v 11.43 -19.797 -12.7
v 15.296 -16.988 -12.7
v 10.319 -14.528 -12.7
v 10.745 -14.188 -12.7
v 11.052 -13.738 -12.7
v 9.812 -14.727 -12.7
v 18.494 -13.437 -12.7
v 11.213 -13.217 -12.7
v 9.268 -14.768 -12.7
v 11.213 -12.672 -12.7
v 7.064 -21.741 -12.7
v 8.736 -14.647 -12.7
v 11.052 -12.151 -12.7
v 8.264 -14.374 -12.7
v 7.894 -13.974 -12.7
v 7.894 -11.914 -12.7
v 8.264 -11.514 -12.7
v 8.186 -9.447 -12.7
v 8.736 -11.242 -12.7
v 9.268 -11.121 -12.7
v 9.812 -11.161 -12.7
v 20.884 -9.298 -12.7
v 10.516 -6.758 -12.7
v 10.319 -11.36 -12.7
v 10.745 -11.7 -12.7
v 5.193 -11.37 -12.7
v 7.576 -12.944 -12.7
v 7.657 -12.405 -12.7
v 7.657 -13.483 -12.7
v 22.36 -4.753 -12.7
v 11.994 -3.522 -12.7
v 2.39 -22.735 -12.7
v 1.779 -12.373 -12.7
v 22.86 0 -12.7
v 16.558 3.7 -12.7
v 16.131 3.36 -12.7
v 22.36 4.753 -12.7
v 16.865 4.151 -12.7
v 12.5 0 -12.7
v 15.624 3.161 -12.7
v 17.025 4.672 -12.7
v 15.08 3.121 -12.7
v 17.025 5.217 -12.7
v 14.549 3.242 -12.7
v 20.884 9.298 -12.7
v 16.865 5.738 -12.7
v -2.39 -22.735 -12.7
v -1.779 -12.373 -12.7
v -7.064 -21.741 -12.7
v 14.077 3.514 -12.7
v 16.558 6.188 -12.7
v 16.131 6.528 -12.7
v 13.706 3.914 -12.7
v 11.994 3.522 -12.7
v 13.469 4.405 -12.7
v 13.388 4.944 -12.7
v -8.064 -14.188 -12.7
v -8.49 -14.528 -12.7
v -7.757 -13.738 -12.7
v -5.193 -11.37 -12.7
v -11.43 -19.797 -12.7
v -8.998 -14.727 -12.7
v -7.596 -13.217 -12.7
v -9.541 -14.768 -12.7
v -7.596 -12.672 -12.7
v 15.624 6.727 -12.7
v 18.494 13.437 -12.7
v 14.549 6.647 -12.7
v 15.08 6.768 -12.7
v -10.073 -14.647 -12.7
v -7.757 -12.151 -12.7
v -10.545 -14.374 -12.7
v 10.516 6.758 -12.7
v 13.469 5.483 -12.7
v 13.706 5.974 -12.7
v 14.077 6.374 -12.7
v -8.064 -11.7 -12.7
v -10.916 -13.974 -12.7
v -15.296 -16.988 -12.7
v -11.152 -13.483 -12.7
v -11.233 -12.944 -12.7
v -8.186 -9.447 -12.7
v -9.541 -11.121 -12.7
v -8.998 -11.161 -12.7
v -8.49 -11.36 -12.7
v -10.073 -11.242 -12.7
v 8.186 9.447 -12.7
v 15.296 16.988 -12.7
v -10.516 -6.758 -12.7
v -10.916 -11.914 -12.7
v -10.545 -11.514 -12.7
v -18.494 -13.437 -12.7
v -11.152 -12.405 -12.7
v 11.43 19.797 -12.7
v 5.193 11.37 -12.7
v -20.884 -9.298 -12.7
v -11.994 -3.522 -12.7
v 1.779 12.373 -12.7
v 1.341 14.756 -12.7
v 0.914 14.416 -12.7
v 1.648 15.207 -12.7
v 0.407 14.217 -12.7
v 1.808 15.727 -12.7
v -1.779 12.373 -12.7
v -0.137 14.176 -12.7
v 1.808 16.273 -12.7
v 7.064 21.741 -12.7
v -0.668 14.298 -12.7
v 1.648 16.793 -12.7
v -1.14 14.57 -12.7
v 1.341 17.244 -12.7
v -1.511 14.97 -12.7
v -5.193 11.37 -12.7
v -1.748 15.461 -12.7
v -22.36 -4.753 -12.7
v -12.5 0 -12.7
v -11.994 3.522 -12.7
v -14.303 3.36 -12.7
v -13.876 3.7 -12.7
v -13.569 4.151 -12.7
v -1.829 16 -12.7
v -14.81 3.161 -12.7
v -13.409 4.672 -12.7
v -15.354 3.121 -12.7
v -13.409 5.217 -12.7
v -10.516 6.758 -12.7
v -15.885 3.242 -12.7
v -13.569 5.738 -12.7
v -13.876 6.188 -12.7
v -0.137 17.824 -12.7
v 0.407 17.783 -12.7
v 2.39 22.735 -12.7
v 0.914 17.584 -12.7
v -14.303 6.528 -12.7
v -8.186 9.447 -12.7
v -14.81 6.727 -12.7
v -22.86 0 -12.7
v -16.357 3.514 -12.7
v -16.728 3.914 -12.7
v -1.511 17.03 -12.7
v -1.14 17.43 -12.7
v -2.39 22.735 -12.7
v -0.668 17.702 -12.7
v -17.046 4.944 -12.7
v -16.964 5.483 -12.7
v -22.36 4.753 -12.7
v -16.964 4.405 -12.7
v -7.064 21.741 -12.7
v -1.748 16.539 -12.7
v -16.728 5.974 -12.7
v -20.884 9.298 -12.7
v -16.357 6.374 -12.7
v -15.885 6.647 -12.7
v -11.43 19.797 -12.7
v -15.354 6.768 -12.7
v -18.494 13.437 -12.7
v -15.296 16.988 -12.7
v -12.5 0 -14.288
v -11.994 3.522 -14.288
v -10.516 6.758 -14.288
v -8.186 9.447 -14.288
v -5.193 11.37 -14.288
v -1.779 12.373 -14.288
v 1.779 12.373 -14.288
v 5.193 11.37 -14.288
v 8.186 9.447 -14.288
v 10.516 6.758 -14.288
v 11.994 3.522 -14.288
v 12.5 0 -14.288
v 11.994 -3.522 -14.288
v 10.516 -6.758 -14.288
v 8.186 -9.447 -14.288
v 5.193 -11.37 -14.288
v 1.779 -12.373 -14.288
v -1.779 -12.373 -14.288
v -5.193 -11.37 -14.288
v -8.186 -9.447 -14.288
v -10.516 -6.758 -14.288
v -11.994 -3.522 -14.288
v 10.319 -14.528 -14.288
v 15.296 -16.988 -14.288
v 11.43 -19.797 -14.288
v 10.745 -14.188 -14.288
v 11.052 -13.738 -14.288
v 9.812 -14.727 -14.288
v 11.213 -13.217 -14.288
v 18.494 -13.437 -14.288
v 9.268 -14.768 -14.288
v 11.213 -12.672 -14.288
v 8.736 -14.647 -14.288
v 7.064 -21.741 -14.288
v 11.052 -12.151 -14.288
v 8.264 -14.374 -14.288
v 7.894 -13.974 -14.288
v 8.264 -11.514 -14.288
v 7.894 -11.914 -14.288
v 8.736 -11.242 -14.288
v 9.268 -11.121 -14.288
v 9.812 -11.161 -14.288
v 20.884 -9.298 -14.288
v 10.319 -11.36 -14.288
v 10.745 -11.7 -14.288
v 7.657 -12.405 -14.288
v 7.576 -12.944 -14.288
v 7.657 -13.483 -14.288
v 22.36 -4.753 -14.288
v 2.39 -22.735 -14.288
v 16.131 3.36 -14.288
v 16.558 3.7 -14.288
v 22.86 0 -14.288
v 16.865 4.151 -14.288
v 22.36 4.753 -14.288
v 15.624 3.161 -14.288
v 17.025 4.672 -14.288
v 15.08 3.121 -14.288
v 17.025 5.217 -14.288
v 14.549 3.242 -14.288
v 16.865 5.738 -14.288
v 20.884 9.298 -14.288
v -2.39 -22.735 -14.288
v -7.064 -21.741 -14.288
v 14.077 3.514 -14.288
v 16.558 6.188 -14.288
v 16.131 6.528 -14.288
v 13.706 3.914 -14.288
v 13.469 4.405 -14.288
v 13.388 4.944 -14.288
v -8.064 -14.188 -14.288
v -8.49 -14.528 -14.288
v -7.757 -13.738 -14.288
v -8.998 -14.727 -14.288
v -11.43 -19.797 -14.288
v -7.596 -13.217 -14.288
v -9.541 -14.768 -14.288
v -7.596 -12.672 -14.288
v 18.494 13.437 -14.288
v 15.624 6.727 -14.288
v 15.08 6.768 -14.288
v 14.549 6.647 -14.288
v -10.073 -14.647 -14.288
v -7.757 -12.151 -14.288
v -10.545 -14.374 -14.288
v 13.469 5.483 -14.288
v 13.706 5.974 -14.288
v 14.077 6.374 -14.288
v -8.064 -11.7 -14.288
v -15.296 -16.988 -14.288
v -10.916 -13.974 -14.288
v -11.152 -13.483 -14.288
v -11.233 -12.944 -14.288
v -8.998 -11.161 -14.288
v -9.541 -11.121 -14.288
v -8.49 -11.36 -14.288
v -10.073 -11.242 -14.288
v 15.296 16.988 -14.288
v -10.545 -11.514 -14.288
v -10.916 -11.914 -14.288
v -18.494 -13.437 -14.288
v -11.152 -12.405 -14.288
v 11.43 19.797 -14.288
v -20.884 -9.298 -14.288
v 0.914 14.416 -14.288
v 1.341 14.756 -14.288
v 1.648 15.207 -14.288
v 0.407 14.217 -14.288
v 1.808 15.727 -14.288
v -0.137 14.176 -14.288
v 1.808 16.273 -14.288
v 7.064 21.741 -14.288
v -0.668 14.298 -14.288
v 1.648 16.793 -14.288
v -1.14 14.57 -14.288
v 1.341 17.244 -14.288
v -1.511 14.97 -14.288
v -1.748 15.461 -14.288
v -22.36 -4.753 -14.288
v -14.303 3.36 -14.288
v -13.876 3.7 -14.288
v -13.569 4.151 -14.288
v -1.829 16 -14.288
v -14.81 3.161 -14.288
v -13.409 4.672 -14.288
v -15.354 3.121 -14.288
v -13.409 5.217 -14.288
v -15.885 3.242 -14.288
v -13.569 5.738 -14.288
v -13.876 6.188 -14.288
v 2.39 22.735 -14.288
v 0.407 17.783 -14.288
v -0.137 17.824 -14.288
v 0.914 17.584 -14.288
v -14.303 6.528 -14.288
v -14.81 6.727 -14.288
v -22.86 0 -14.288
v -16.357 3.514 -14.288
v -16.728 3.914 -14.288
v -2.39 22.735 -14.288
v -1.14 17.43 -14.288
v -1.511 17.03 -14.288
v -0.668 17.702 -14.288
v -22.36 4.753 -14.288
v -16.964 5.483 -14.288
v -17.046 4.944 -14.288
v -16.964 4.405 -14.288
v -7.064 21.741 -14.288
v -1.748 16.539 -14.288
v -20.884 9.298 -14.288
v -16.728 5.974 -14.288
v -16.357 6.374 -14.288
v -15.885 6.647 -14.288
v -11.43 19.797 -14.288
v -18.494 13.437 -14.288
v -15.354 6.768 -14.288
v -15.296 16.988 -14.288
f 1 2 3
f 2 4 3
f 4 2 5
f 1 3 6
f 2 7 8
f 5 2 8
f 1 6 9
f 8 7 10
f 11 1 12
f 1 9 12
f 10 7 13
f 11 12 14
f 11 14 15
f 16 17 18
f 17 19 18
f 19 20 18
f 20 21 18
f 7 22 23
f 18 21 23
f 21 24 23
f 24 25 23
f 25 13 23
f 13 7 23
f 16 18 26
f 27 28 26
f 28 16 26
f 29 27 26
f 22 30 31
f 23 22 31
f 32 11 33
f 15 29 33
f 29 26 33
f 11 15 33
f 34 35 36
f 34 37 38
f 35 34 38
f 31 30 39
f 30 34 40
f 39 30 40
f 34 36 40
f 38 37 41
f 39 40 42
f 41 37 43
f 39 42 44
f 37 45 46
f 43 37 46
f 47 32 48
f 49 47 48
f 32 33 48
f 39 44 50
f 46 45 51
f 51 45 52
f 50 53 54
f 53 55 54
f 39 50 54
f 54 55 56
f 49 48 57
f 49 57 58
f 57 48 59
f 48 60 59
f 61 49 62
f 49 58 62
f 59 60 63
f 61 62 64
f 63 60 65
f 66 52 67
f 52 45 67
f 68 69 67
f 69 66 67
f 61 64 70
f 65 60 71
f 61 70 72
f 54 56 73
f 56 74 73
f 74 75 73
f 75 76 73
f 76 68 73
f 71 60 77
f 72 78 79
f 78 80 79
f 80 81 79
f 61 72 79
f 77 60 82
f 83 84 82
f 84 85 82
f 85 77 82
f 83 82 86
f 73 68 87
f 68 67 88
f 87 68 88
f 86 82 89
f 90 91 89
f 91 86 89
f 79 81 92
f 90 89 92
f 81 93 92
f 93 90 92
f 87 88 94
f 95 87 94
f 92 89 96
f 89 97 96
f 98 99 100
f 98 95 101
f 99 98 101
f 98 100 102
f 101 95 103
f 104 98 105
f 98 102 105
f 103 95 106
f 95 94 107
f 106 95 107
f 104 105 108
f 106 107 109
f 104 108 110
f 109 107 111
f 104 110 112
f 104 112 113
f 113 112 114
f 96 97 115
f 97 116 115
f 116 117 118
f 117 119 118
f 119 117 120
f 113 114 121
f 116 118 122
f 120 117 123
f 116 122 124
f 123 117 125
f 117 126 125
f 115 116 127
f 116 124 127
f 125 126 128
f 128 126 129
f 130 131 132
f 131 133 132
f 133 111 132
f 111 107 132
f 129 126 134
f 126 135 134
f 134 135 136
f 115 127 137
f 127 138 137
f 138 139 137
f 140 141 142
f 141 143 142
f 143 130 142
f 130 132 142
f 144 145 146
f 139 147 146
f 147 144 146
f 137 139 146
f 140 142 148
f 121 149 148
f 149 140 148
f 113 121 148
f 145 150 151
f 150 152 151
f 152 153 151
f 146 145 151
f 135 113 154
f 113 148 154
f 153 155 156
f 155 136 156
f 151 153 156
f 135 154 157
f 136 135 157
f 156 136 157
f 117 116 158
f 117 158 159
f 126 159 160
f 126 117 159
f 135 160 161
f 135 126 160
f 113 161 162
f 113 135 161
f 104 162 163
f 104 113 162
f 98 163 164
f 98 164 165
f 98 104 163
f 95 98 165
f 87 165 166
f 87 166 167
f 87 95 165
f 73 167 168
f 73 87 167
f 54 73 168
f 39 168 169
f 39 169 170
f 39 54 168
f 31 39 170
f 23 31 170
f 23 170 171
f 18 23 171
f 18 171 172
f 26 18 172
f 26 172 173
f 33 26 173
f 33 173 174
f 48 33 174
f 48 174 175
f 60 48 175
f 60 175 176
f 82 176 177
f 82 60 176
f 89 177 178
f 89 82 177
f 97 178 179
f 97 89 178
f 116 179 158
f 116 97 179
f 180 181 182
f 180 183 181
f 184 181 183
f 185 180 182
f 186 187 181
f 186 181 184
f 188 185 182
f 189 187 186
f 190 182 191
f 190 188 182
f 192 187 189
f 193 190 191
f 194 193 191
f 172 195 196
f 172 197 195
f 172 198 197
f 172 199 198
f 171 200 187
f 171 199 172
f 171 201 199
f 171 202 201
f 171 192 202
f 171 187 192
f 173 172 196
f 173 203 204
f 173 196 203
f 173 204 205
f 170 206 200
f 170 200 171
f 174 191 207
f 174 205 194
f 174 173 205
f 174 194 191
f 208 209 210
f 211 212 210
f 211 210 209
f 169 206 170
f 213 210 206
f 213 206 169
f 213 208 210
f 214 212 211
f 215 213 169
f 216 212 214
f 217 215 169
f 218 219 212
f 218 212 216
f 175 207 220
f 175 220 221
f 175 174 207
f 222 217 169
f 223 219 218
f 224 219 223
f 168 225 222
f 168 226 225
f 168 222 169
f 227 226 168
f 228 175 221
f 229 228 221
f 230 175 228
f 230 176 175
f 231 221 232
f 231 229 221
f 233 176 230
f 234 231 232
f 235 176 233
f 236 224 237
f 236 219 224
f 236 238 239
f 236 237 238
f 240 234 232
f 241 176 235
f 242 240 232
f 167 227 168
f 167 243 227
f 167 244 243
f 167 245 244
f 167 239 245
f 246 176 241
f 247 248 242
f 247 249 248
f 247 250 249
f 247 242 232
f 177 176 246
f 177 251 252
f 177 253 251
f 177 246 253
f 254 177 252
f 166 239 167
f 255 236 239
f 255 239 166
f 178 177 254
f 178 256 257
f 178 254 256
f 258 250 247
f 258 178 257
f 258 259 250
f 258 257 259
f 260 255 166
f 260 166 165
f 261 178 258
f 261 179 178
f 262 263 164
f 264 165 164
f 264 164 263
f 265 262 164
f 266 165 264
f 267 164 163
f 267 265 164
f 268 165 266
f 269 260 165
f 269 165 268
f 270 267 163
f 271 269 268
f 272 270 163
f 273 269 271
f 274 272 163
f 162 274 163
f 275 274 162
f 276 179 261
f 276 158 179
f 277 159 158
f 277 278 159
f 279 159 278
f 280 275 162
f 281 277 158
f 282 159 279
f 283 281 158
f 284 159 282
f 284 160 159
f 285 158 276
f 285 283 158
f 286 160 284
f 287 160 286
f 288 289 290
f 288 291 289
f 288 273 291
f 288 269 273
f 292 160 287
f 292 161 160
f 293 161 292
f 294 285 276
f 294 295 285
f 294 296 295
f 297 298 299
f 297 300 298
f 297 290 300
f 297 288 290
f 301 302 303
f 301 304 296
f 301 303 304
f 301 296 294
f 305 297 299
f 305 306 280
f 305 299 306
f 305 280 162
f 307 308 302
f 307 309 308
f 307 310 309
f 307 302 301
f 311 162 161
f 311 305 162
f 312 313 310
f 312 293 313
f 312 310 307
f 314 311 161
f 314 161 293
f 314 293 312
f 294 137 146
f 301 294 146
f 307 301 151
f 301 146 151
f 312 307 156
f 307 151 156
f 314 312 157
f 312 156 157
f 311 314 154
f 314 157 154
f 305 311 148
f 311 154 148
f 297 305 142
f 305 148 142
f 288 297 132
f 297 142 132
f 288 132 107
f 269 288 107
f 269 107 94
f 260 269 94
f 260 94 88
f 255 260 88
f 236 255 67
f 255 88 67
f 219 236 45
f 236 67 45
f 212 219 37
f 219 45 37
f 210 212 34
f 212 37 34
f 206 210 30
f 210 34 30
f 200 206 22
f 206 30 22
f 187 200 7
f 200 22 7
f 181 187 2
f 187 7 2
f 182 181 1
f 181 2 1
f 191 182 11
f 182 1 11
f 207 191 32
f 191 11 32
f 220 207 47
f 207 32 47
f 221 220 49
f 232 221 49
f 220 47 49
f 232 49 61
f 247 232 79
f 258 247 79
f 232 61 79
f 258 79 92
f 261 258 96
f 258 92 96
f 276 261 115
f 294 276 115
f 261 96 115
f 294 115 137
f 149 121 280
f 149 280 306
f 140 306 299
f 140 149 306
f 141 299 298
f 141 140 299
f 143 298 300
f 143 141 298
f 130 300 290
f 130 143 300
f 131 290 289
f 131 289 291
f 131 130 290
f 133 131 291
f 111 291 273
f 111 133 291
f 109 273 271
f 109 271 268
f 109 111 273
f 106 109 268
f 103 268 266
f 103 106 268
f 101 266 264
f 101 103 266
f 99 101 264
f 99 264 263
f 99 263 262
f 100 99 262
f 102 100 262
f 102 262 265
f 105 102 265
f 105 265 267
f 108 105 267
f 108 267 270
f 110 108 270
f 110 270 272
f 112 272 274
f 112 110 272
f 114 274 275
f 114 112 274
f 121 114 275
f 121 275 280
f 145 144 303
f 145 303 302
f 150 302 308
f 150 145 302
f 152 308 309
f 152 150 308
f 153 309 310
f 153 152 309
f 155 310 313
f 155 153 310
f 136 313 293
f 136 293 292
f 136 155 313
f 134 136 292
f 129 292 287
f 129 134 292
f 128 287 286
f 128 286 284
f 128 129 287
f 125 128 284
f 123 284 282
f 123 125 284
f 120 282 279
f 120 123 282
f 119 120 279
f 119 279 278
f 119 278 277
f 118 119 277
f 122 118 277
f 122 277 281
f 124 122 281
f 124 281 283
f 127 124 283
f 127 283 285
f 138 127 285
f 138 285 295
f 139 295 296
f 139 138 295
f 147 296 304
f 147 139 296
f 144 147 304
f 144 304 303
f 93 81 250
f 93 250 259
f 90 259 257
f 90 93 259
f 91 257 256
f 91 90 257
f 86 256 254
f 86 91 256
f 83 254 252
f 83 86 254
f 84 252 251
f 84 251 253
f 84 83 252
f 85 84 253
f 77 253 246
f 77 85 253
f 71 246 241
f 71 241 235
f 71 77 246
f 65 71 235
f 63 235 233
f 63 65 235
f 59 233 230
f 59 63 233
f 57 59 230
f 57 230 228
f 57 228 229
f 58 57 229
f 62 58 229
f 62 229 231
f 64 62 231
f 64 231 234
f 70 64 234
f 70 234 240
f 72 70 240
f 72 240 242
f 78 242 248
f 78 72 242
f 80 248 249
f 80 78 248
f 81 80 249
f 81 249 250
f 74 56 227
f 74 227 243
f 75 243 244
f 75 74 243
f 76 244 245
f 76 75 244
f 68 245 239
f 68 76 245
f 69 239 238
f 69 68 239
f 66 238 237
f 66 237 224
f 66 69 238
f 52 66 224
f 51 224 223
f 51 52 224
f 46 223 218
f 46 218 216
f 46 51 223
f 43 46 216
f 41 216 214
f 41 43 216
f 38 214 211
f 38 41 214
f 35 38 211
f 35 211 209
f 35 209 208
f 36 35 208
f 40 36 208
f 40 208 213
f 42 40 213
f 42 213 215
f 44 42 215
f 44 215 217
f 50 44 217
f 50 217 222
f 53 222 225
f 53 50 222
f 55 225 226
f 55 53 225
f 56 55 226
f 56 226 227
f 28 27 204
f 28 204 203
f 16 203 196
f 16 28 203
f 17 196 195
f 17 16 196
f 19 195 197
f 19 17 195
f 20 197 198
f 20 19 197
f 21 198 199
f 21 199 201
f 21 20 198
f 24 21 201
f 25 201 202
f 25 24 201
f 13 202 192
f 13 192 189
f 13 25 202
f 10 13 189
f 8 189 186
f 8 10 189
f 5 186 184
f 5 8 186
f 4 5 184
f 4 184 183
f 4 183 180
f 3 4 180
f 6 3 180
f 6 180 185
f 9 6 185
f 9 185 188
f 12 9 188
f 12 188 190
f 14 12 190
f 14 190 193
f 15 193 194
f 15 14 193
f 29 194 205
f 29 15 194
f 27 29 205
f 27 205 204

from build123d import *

# Parameters (mm, degrees)
SKETCH1_R           = 22.86
SKETCH1_R_2         = 12.5
SKETCH1_R_3         = 1.8288
BOSS_EXTRUDE1_DEPTH = 1.5875


with BuildPart() as part:
    # Sketch1 → Boss-Extrude1 (new body)
    with BuildSketch(Plane(origin=(0, 0, -12.7), x_dir=(-1, 0, 0), z_dir=(0, 0, -1))):
        Circle(SKETCH1_R)
        Circle(SKETCH1_R_2, mode=Mode.SUBTRACT)
        with Locations((15.216904261, 4.94427191)):
            Circle(SKETCH1_R_3, mode=Mode.SUBTRACT)
        with Locations((9.404564037, -12.94427191)):
            Circle(SKETCH1_R_3, mode=Mode.SUBTRACT)
        with Locations((-9.404564037, -12.94427191)):
            Circle(SKETCH1_R_3, mode=Mode.SUBTRACT)
        with Locations((-15.216904261, 4.94427191)):
            Circle(SKETCH1_R_3, mode=Mode.SUBTRACT)
        with Locations((0, 16)):
            Circle(SKETCH1_R_3, mode=Mode.SUBTRACT)
    extrude(amount=BOSS_EXTRUDE1_DEPTH)


solid = part.part
